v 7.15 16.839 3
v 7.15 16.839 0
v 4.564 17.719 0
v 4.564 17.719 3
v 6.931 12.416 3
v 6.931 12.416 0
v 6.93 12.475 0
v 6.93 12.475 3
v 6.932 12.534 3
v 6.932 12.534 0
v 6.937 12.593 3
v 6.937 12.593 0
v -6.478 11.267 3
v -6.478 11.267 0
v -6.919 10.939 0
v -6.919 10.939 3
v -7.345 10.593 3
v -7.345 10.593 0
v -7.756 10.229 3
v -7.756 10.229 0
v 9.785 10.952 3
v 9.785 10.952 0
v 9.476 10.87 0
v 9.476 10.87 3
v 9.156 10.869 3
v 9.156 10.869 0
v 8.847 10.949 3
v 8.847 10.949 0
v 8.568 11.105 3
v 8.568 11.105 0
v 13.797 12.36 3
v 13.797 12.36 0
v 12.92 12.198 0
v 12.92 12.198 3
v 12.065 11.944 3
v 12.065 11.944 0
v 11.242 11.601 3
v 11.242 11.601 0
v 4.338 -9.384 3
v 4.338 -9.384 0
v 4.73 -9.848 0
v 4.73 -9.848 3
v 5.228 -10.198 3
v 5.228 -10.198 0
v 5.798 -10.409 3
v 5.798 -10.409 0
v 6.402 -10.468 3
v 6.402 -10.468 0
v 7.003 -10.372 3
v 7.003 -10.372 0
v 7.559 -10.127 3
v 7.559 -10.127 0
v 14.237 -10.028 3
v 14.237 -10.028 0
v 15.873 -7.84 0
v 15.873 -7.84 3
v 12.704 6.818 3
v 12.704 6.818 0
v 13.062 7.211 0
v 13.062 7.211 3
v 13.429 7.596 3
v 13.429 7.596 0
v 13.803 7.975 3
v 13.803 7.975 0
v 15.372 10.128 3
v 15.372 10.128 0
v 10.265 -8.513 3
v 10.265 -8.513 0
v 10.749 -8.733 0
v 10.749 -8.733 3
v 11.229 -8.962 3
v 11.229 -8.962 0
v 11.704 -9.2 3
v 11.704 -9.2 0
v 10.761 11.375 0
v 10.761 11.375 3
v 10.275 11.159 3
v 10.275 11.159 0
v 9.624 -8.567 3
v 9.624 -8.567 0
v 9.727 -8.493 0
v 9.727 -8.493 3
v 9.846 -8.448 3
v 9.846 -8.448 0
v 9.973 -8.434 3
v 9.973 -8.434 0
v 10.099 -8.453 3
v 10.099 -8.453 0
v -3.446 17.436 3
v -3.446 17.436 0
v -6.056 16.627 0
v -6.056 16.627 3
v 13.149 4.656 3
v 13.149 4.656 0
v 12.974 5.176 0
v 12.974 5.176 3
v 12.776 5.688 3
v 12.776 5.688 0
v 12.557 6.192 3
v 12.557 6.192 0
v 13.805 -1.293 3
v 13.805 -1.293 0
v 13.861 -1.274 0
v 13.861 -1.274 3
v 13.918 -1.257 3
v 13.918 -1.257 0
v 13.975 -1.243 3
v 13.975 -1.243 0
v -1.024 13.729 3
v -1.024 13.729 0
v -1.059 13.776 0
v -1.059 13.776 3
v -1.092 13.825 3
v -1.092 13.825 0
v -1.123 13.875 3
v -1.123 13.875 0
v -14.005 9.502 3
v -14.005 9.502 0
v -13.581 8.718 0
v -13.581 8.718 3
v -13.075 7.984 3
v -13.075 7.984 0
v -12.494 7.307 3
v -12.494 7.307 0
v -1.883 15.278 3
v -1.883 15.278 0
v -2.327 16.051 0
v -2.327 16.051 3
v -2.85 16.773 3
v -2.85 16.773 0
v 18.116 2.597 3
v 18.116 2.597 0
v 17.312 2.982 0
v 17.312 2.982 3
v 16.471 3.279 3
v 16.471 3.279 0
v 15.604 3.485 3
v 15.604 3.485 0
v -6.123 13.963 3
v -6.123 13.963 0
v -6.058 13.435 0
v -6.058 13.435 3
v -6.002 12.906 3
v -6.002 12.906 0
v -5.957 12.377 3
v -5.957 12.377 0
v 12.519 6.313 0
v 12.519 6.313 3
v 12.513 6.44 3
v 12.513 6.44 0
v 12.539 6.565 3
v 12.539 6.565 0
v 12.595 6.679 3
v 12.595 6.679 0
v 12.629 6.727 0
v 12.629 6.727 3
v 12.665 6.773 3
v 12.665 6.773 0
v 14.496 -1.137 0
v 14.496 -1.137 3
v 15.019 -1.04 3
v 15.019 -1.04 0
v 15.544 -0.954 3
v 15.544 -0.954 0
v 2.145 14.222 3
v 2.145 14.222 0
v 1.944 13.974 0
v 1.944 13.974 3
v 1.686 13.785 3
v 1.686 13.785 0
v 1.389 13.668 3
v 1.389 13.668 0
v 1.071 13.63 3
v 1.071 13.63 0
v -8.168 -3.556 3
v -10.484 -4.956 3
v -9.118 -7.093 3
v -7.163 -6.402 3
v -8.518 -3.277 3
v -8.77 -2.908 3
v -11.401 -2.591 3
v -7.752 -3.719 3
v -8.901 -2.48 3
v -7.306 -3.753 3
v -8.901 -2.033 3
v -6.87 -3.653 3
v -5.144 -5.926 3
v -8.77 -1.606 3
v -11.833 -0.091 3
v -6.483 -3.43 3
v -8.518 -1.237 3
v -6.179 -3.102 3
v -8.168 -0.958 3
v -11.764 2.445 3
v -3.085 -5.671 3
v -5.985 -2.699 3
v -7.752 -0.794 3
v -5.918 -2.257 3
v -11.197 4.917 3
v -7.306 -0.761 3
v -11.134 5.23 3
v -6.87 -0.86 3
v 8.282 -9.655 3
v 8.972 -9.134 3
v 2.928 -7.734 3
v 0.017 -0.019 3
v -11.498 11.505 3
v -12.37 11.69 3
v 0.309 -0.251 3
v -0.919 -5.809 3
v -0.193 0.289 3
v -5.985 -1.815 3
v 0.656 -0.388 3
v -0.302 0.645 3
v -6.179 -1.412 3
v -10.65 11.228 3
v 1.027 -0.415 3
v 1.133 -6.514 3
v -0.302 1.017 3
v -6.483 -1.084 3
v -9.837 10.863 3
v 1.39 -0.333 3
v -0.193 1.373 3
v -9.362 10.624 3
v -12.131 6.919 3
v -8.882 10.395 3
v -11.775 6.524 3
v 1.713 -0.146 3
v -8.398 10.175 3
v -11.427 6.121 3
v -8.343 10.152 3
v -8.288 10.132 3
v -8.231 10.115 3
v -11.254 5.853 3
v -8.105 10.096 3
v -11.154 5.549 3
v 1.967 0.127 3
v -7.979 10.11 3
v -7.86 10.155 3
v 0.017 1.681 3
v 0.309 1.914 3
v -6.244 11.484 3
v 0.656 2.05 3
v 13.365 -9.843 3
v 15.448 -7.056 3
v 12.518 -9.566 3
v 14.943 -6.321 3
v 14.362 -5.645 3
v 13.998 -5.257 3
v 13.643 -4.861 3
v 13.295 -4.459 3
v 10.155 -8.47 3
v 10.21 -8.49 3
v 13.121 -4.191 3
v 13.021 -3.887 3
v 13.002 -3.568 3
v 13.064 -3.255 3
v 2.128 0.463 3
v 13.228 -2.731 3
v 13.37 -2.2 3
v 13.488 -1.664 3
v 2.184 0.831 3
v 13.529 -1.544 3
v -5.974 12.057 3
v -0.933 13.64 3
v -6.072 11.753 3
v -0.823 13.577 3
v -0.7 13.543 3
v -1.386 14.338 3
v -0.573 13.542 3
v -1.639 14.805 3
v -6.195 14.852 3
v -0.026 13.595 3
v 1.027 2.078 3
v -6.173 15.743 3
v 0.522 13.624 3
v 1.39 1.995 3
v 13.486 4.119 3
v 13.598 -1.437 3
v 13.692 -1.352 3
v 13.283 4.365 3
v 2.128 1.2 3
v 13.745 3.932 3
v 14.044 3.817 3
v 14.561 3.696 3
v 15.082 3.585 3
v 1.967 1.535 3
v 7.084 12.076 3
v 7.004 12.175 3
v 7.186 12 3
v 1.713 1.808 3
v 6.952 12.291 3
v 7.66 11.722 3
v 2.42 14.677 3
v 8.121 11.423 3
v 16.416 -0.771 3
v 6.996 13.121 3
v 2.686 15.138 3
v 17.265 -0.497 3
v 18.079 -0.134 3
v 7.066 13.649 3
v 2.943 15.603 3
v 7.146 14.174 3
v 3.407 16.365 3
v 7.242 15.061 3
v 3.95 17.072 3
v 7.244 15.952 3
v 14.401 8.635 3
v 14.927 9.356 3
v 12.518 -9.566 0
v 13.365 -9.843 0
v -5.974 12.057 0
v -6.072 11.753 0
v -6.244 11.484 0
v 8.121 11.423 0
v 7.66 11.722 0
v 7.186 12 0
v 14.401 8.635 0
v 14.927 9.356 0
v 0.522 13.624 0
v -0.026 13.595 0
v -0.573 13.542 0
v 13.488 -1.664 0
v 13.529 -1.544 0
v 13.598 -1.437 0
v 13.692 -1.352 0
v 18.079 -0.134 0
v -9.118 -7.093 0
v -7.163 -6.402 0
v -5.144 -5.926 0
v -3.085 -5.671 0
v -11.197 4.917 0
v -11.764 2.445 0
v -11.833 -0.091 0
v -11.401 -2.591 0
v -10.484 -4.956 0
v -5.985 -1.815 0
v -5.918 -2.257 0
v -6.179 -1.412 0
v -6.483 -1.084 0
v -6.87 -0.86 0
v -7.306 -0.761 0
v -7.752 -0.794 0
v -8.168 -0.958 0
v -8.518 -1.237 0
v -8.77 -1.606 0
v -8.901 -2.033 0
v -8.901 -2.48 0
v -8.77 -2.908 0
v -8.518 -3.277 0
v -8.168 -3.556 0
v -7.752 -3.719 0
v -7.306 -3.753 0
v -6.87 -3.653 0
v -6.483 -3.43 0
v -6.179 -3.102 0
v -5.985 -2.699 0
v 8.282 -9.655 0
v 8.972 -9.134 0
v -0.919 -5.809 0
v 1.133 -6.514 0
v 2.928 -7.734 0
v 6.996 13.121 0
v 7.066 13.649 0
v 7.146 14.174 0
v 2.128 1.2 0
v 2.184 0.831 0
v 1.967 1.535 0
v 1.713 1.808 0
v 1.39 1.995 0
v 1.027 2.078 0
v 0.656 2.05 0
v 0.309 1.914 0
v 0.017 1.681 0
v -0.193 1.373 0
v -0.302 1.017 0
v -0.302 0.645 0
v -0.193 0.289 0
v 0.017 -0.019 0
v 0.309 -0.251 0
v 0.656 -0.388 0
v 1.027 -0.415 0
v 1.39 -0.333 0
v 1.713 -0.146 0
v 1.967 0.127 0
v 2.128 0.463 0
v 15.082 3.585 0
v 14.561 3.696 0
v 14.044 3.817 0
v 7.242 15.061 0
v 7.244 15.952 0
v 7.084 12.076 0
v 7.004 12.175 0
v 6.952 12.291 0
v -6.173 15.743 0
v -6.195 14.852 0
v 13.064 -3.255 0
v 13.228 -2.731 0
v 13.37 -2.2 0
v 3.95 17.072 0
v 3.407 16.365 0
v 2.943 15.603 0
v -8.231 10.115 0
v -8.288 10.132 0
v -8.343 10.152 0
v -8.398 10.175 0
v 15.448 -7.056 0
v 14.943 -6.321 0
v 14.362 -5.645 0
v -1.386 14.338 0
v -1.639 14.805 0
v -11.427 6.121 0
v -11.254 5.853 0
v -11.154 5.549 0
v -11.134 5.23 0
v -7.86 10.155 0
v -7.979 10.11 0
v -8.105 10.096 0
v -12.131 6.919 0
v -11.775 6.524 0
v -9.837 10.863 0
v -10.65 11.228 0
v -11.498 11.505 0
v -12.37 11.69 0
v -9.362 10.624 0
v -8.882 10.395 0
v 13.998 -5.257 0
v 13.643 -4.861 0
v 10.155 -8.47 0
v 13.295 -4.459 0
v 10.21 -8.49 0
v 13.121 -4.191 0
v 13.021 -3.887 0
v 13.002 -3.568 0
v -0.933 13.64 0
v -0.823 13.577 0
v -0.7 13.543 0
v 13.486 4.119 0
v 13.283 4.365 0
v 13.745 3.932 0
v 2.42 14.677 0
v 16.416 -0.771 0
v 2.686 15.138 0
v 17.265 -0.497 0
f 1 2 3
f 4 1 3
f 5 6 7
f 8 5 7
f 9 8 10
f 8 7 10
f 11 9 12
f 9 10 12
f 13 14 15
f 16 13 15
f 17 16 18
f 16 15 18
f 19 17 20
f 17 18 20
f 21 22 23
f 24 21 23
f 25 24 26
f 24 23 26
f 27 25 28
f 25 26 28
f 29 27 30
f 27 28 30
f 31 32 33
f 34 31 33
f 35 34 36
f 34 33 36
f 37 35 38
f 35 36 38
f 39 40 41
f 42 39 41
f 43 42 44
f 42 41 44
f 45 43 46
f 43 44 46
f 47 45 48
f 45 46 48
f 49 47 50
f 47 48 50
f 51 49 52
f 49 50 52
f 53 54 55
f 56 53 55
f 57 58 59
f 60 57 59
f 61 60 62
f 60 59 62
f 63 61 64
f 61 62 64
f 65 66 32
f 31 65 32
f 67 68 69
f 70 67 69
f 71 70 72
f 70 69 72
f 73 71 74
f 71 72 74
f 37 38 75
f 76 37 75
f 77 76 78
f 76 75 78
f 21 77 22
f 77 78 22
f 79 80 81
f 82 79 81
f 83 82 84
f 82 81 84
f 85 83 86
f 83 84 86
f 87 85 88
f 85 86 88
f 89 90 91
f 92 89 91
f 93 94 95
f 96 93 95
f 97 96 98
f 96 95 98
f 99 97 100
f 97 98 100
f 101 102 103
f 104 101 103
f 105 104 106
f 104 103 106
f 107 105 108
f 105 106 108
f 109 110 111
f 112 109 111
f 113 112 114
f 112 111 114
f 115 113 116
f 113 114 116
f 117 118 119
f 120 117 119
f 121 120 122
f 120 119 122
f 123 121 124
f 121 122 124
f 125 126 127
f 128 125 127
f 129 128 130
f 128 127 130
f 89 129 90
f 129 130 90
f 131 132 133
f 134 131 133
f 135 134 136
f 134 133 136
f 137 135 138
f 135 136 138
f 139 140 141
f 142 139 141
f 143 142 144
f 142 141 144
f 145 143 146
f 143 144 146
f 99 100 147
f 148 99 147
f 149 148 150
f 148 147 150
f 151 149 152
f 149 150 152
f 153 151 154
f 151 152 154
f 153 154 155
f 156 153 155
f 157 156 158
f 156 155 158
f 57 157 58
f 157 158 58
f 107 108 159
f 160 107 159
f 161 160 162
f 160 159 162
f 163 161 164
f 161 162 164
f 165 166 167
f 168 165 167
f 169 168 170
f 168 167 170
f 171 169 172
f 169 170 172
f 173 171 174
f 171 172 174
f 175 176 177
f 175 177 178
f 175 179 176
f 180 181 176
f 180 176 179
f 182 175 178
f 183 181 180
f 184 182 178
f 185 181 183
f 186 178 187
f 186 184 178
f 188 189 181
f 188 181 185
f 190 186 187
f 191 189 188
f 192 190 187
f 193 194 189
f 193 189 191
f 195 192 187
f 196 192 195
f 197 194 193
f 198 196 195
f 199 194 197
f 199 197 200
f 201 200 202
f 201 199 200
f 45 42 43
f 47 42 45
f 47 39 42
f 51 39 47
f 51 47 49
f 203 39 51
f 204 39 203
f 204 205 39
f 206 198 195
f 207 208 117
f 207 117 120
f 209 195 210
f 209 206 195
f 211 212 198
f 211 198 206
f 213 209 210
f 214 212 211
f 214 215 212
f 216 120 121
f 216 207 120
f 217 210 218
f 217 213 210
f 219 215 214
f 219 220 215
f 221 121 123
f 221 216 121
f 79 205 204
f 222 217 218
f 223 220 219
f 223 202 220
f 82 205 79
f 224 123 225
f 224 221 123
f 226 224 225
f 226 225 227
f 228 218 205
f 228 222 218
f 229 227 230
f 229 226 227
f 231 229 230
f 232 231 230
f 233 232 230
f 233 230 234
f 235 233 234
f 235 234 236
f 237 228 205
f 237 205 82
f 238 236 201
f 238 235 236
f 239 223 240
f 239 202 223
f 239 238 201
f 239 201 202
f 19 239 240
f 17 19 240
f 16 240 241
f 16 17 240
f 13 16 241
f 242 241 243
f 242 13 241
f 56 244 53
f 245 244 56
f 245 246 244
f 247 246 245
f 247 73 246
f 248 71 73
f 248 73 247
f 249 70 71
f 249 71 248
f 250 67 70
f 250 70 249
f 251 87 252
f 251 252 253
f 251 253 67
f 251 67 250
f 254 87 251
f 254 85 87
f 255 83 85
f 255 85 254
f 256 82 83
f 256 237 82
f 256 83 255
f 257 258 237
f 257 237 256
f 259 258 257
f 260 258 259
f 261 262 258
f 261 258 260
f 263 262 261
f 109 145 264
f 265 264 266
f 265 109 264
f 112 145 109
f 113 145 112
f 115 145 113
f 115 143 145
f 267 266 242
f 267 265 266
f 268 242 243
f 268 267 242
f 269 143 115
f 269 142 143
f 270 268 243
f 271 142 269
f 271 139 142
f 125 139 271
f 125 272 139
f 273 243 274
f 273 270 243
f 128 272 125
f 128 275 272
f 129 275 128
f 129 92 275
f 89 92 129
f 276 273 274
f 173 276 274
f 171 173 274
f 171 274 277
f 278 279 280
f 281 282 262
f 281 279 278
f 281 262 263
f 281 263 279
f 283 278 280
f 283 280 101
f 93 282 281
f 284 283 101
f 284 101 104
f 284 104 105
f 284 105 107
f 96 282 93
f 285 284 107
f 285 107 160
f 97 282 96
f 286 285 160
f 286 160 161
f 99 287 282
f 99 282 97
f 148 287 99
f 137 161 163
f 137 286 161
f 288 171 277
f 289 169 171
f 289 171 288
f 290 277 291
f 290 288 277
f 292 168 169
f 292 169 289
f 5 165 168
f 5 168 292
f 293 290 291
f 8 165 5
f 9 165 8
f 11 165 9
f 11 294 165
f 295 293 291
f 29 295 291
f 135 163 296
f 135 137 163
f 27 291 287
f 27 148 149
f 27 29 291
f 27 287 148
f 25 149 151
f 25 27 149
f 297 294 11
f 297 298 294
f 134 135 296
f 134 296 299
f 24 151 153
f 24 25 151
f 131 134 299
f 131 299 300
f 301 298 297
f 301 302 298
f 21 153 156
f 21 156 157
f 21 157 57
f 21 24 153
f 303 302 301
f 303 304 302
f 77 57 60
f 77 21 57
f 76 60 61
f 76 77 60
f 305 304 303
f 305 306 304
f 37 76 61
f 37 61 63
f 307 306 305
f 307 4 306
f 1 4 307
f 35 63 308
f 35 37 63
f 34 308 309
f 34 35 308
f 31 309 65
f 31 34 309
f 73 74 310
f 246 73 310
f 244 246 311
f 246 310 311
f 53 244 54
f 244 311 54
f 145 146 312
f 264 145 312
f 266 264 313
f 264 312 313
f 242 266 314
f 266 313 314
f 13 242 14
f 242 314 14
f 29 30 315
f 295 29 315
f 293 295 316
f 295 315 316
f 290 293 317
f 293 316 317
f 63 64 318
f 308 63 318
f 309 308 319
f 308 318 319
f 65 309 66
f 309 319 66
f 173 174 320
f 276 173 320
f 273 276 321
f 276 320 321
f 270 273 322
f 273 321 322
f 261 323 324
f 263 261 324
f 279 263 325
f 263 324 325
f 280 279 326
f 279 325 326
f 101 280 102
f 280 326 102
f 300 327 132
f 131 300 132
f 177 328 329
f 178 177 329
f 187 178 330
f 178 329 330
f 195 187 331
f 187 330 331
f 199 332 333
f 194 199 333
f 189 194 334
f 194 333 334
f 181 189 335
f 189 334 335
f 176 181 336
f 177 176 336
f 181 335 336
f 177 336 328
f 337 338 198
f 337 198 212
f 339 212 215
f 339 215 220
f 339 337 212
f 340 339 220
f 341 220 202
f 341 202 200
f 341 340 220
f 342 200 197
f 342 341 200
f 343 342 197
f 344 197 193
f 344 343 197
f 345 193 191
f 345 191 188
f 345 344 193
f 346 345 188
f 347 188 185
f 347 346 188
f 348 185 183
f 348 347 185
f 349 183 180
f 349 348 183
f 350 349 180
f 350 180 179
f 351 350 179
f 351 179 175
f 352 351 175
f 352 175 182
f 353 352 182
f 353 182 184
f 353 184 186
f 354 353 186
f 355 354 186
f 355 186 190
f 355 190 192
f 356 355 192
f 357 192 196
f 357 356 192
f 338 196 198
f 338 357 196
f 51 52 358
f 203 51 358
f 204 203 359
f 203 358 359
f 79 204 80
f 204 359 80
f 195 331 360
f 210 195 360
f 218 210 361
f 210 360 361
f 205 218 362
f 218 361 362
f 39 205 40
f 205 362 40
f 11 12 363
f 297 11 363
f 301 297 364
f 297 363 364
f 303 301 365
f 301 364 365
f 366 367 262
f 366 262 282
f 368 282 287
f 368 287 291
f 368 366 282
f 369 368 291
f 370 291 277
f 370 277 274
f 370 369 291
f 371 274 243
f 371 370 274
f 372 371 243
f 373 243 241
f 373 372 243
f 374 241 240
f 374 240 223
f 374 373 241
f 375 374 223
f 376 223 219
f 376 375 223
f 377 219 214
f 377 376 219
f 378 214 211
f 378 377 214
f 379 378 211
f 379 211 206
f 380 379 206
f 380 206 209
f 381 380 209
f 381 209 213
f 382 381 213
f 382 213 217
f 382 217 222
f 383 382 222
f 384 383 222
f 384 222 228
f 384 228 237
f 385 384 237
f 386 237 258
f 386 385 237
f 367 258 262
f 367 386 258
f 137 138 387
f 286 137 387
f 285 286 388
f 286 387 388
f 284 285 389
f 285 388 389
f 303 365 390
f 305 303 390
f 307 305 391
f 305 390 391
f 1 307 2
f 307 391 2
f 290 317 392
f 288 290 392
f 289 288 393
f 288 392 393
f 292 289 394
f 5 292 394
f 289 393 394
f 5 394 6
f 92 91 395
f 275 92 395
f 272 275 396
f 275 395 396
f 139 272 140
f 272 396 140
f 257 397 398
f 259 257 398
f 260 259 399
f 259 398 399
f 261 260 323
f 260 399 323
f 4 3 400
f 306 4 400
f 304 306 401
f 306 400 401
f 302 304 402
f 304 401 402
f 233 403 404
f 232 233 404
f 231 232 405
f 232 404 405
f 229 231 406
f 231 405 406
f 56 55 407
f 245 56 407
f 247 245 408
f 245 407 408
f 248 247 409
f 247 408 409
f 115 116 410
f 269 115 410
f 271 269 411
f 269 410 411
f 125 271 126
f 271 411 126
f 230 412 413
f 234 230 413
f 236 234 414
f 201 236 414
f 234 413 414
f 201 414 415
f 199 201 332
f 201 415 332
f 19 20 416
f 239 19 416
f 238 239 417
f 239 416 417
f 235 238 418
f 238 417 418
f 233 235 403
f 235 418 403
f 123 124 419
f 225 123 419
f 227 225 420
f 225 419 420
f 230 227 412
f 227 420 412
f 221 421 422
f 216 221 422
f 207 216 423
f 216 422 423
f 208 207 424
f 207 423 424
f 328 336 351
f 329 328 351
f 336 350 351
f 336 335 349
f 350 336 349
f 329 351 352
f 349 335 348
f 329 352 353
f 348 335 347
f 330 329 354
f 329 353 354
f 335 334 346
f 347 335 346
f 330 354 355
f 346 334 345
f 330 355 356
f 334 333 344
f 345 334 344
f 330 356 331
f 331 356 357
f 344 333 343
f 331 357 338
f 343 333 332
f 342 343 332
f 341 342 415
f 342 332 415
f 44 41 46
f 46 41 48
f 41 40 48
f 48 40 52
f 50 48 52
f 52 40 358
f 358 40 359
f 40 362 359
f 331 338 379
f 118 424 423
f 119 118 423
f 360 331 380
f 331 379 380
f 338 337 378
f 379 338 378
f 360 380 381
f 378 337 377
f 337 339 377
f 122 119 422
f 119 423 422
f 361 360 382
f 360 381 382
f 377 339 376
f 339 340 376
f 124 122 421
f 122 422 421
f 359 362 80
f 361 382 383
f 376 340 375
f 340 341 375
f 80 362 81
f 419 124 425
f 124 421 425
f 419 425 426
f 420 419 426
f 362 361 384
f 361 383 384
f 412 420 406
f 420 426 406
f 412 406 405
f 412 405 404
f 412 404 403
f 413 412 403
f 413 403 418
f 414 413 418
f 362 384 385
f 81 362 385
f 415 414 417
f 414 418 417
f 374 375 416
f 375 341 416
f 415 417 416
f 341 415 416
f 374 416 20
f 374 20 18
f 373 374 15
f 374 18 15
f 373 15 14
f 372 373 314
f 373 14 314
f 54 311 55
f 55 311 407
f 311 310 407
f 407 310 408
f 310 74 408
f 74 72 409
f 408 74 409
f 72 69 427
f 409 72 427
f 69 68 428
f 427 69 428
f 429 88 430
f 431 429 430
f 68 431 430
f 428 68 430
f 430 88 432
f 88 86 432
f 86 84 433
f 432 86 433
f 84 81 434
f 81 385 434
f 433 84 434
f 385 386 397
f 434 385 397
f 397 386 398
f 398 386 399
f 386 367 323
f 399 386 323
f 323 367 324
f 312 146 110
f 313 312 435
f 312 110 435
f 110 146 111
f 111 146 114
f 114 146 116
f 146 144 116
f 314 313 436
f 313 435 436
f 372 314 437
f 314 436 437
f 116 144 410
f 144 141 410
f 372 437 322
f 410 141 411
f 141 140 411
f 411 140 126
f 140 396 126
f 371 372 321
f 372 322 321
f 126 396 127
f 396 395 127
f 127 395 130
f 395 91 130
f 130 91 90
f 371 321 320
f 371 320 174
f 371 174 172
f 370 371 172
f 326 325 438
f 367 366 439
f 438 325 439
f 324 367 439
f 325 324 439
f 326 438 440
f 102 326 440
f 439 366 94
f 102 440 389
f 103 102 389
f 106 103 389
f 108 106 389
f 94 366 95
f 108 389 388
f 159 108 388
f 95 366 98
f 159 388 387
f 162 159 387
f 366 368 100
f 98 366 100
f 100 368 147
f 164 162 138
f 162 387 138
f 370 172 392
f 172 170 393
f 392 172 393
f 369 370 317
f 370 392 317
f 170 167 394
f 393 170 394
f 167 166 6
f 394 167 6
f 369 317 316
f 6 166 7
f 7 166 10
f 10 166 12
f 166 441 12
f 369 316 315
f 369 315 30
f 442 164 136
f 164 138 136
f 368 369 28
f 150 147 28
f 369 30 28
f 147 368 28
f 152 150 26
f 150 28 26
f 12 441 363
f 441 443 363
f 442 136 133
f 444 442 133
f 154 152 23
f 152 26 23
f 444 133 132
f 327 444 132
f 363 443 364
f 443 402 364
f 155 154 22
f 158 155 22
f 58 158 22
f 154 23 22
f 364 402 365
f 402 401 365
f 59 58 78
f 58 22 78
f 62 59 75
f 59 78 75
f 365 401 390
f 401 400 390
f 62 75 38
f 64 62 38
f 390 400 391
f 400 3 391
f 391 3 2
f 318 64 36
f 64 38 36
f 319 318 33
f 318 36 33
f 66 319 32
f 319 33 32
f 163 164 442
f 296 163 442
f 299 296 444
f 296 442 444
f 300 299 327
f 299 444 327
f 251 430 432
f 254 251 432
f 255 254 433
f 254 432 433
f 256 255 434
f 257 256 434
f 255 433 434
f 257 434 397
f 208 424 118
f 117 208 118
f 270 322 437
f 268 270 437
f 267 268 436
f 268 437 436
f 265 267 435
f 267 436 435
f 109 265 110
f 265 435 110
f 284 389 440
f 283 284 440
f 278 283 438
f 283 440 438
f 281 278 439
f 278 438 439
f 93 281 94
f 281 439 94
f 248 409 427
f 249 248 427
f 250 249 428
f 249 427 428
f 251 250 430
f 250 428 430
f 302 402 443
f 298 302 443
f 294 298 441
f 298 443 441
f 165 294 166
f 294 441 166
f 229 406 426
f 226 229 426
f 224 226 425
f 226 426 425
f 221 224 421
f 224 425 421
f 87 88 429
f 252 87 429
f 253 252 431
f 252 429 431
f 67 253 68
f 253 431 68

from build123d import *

# Parameters (mm, degrees)
SKETCH1_R           = 1.5
SKETCH1_R_2         = 1.25
BOSS_EXTRUDE1_DEPTH = 3


with BuildPart() as part:
    # Sketch1 → Boss-Extrude1 (new body)
    with BuildSketch(Plane.XY):
        with BuildLine():
            Line((18.079443034, -0.134472667), (18.116448206, 2.597069427))
            ThreePointArc((18.116448206, 2.597069427), (16.895577145, 3.141355734), (15.603766672, 3.48486619))
            ThreePointArc((15.603766672, 3.48486619), (14.82120671, 3.639343944), (14.043536913, 3.816807057))
            ThreePointArc((14.043536913, 3.816807057), (13.486015309, 4.11861181), (13.148996222, 4.655579763))
            ThreePointArc((13.148996222, 4.655579763), (12.877808188, 5.433093829), (12.557188118, 6.191561919))
            ThreePointArc((12.557188118, 6.191561919), (12.512759529, 6.440033201), (12.595364936, 6.678545725))
            ThreePointArc((12.595364936, 6.678545725), (12.647044724, 6.750316962), (12.70368256, 6.818243882))
            ThreePointArc((12.70368256, 6.818243882), (13.244598766, 7.404475621), (13.802549183, 7.974518889))
            ThreePointArc((13.802549183, 7.974518889), (14.673526858, 8.988509045), (15.372435088, 10.12794111))
            Line((15.372435088, 10.12794111), (13.796812742, 12.35955618))
            ThreePointArc((13.796812742, 12.35955618), (12.489183841, 12.082283047), (11.242176835, 11.600881699))
            ThreePointArc((11.242176835, 11.600881699), (10.518272782, 11.265879623), (9.784814499, 10.95234746))
            ThreePointArc((9.784814499, 10.95234746), (9.156373664, 10.868809657), (8.568097651, 11.105131008))
            ThreePointArc((8.568097651, 11.105131008), (7.891690622, 11.574752773), (7.186487179, 11.999910599))
            ThreePointArc((7.186487179, 11.999910599), (7.00449594, 12.174813619), (6.931130974, 12.416328545))
            ThreePointArc((6.931130974, 12.416328545), (6.930754726, 12.504769312), (6.936649256, 12.59301423))
            ThreePointArc((6.936649256, 12.59301423), (7.029681289, 13.385228238), (7.146009632, 14.174357956))
            ThreePointArc((7.146009632, 14.174357956), (7.254636913, 15.506641056), (7.150324186, 16.839268911))
            Line((7.150324186, 16.839268911), (4.563908504, 17.71855585))
            ThreePointArc((4.563908504, 17.71855585), (3.668991559, 16.72563219), (2.943102312, 15.603197991))
            ThreePointArc((2.943102312, 15.603197991), (2.55436091, 14.906675492), (2.145270277, 14.221906682))
            ThreePointArc((2.145270277, 14.221906682), (1.685953249, 13.784934925), (1.071121753, 13.630342949))
            ThreePointArc((1.071121753, 13.630342949), (0.247860223, 13.612692862), (-0.572562847, 13.542144585))
            ThreePointArc((-0.572562847, 13.542144585), (-0.822602268, 13.576672334), (-1.023914683, 13.728939169))
            ThreePointArc((-1.023914683, 13.728939169), (-1.076203253, 13.8002681), (-1.12330354, 13.875124455))
            ThreePointArc((-1.12330354, 13.875124455), (-1.513690755, 14.570721908), (-1.883417958, 15.277517345))
            ThreePointArc((-1.883417958, 15.277517345), (-2.578633, 16.419206529), (-3.446322769, 17.436011628))
            Line((-3.446322769, 17.436011628), (-6.055608905, 16.62711271))
            ThreePointArc((-6.055608905, 16.62711271), (-6.195986038, 15.297801614), (-6.123492507, 13.963066277))
            ThreePointArc((-6.123492507, 13.963066277), (-6.028585255, 13.171071275), (-5.957049521, 12.376624229))
            ThreePointArc((-5.957049521, 12.376624229), (-6.071799248, 11.753126877), (-6.478341494, 11.266670455))
            ThreePointArc((-6.478341494, 11.266670455), (-7.133999602, 10.768490249), (-7.756268571, 10.229182913))
            ThreePointArc((-7.756268571, 10.229182913), (-7.978849614, 10.110146965), (-8.231214979, 10.115004953))
            ThreePointArc((-8.231214979, 10.115004953), (-8.315443414, 10.14197682), (-8.397547808, 10.17485203))
            ThreePointArc((-8.397547808, 10.17485203), (-9.122239624, 10.508138343), (-9.836799148, 10.862627665))
            ThreePointArc((-9.836799148, 10.862627665), (-11.070307997, 11.377636469), (-12.369946808, 11.690233824))
            Line((-12.369946808, 11.690233824), (-14.005444781, 9.502120943))
            ThreePointArc((-14.005444781, 9.502120943), (-13.337662809, 8.344174067), (-12.494476564, 7.306961125))
            ThreePointArc((-12.494476564, 7.306961125), (-11.952172002, 6.722008792), (-11.427334121, 6.12133528))
            ThreePointArc((-11.427334121, 6.12133528), (-11.153686052, 5.549467129), (-11.196653727, 4.91695608))
            ThreePointArc((-11.196653727, 4.91695608), (-11.678838592, -1.351524146), (-9.118252224, -7.093452745))
            ThreePointArc((-9.118252224, -7.093452745), (-6.159667353, -6.136962556), (-3.085467527, -5.670707959))
            ThreePointArc((-3.085467527, -5.670707959), (1.133419318, -6.513694494), (4.3378838, -9.384415639))
            ThreePointArc((4.3378838, -9.384415639), (5.797671296, -10.408859622), (7.558678835, -10.127226075))
            ThreePointArc((7.558678835, -10.127226075), (8.631472289, -9.400453805), (9.623684759, -8.567028257))
            ThreePointArc((9.623684759, -8.567028257), (9.846265801, -8.447992309), (10.098631166, -8.452850297))
            ThreePointArc((10.098631166, -8.452850297), (10.182859602, -8.479822164), (10.264963995, -8.512697373))
            ThreePointArc((10.264963995, -8.512697373), (10.989655811, -8.845983686), (11.704215336, -9.200473008))
            ThreePointArc((11.704215336, -9.200473008), (12.937724185, -9.715481811), (14.237362996, -10.028079165))
            Line((14.237362996, -10.028079165), (15.872860968, -7.839966284))
            ThreePointArc((15.872860968, -7.839966284), (15.205078995, -6.682019407), (14.361892749, -5.644806466))
            ThreePointArc((14.361892749, -5.644806466), (13.819588187, -5.059854134), (13.294750306, -4.459180622))
            ThreePointArc((13.294750306, -4.459180622), (13.021102236, -3.887312471), (13.064069415, -3.254802895))
            ThreePointArc((13.064069415, -3.254802895), (13.301685284, -2.466379753), (13.488114756, -1.664309679))
            ThreePointArc((13.488114756, -1.664309679), (13.598219027, -1.43717772), (13.80524235, -1.292771275))
            ThreePointArc((13.80524235, -1.292771275), (13.889238251, -1.265083742), (13.974985665, -1.243420593))
            ThreePointArc((13.974985665, -1.243420593), (14.757174439, -1.087091722), (15.543628834, -0.953872058))
            ThreePointArc((15.543628834, -0.953872058), (16.844273034, -0.645484622), (18.079443034, -0.134472667))
        make_face()
        with Locations((-7.418095669, -2.256802895)):
            Circle(SKETCH1_R, mode=Mode.SUBTRACT)
        with Locations((0.933711072, 0.831073783)):
            Circle(SKETCH1_R_2, mode=Mode.SUBTRACT)
    extrude(amount=BOSS_EXTRUDE1_DEPTH)


solid = part.part
